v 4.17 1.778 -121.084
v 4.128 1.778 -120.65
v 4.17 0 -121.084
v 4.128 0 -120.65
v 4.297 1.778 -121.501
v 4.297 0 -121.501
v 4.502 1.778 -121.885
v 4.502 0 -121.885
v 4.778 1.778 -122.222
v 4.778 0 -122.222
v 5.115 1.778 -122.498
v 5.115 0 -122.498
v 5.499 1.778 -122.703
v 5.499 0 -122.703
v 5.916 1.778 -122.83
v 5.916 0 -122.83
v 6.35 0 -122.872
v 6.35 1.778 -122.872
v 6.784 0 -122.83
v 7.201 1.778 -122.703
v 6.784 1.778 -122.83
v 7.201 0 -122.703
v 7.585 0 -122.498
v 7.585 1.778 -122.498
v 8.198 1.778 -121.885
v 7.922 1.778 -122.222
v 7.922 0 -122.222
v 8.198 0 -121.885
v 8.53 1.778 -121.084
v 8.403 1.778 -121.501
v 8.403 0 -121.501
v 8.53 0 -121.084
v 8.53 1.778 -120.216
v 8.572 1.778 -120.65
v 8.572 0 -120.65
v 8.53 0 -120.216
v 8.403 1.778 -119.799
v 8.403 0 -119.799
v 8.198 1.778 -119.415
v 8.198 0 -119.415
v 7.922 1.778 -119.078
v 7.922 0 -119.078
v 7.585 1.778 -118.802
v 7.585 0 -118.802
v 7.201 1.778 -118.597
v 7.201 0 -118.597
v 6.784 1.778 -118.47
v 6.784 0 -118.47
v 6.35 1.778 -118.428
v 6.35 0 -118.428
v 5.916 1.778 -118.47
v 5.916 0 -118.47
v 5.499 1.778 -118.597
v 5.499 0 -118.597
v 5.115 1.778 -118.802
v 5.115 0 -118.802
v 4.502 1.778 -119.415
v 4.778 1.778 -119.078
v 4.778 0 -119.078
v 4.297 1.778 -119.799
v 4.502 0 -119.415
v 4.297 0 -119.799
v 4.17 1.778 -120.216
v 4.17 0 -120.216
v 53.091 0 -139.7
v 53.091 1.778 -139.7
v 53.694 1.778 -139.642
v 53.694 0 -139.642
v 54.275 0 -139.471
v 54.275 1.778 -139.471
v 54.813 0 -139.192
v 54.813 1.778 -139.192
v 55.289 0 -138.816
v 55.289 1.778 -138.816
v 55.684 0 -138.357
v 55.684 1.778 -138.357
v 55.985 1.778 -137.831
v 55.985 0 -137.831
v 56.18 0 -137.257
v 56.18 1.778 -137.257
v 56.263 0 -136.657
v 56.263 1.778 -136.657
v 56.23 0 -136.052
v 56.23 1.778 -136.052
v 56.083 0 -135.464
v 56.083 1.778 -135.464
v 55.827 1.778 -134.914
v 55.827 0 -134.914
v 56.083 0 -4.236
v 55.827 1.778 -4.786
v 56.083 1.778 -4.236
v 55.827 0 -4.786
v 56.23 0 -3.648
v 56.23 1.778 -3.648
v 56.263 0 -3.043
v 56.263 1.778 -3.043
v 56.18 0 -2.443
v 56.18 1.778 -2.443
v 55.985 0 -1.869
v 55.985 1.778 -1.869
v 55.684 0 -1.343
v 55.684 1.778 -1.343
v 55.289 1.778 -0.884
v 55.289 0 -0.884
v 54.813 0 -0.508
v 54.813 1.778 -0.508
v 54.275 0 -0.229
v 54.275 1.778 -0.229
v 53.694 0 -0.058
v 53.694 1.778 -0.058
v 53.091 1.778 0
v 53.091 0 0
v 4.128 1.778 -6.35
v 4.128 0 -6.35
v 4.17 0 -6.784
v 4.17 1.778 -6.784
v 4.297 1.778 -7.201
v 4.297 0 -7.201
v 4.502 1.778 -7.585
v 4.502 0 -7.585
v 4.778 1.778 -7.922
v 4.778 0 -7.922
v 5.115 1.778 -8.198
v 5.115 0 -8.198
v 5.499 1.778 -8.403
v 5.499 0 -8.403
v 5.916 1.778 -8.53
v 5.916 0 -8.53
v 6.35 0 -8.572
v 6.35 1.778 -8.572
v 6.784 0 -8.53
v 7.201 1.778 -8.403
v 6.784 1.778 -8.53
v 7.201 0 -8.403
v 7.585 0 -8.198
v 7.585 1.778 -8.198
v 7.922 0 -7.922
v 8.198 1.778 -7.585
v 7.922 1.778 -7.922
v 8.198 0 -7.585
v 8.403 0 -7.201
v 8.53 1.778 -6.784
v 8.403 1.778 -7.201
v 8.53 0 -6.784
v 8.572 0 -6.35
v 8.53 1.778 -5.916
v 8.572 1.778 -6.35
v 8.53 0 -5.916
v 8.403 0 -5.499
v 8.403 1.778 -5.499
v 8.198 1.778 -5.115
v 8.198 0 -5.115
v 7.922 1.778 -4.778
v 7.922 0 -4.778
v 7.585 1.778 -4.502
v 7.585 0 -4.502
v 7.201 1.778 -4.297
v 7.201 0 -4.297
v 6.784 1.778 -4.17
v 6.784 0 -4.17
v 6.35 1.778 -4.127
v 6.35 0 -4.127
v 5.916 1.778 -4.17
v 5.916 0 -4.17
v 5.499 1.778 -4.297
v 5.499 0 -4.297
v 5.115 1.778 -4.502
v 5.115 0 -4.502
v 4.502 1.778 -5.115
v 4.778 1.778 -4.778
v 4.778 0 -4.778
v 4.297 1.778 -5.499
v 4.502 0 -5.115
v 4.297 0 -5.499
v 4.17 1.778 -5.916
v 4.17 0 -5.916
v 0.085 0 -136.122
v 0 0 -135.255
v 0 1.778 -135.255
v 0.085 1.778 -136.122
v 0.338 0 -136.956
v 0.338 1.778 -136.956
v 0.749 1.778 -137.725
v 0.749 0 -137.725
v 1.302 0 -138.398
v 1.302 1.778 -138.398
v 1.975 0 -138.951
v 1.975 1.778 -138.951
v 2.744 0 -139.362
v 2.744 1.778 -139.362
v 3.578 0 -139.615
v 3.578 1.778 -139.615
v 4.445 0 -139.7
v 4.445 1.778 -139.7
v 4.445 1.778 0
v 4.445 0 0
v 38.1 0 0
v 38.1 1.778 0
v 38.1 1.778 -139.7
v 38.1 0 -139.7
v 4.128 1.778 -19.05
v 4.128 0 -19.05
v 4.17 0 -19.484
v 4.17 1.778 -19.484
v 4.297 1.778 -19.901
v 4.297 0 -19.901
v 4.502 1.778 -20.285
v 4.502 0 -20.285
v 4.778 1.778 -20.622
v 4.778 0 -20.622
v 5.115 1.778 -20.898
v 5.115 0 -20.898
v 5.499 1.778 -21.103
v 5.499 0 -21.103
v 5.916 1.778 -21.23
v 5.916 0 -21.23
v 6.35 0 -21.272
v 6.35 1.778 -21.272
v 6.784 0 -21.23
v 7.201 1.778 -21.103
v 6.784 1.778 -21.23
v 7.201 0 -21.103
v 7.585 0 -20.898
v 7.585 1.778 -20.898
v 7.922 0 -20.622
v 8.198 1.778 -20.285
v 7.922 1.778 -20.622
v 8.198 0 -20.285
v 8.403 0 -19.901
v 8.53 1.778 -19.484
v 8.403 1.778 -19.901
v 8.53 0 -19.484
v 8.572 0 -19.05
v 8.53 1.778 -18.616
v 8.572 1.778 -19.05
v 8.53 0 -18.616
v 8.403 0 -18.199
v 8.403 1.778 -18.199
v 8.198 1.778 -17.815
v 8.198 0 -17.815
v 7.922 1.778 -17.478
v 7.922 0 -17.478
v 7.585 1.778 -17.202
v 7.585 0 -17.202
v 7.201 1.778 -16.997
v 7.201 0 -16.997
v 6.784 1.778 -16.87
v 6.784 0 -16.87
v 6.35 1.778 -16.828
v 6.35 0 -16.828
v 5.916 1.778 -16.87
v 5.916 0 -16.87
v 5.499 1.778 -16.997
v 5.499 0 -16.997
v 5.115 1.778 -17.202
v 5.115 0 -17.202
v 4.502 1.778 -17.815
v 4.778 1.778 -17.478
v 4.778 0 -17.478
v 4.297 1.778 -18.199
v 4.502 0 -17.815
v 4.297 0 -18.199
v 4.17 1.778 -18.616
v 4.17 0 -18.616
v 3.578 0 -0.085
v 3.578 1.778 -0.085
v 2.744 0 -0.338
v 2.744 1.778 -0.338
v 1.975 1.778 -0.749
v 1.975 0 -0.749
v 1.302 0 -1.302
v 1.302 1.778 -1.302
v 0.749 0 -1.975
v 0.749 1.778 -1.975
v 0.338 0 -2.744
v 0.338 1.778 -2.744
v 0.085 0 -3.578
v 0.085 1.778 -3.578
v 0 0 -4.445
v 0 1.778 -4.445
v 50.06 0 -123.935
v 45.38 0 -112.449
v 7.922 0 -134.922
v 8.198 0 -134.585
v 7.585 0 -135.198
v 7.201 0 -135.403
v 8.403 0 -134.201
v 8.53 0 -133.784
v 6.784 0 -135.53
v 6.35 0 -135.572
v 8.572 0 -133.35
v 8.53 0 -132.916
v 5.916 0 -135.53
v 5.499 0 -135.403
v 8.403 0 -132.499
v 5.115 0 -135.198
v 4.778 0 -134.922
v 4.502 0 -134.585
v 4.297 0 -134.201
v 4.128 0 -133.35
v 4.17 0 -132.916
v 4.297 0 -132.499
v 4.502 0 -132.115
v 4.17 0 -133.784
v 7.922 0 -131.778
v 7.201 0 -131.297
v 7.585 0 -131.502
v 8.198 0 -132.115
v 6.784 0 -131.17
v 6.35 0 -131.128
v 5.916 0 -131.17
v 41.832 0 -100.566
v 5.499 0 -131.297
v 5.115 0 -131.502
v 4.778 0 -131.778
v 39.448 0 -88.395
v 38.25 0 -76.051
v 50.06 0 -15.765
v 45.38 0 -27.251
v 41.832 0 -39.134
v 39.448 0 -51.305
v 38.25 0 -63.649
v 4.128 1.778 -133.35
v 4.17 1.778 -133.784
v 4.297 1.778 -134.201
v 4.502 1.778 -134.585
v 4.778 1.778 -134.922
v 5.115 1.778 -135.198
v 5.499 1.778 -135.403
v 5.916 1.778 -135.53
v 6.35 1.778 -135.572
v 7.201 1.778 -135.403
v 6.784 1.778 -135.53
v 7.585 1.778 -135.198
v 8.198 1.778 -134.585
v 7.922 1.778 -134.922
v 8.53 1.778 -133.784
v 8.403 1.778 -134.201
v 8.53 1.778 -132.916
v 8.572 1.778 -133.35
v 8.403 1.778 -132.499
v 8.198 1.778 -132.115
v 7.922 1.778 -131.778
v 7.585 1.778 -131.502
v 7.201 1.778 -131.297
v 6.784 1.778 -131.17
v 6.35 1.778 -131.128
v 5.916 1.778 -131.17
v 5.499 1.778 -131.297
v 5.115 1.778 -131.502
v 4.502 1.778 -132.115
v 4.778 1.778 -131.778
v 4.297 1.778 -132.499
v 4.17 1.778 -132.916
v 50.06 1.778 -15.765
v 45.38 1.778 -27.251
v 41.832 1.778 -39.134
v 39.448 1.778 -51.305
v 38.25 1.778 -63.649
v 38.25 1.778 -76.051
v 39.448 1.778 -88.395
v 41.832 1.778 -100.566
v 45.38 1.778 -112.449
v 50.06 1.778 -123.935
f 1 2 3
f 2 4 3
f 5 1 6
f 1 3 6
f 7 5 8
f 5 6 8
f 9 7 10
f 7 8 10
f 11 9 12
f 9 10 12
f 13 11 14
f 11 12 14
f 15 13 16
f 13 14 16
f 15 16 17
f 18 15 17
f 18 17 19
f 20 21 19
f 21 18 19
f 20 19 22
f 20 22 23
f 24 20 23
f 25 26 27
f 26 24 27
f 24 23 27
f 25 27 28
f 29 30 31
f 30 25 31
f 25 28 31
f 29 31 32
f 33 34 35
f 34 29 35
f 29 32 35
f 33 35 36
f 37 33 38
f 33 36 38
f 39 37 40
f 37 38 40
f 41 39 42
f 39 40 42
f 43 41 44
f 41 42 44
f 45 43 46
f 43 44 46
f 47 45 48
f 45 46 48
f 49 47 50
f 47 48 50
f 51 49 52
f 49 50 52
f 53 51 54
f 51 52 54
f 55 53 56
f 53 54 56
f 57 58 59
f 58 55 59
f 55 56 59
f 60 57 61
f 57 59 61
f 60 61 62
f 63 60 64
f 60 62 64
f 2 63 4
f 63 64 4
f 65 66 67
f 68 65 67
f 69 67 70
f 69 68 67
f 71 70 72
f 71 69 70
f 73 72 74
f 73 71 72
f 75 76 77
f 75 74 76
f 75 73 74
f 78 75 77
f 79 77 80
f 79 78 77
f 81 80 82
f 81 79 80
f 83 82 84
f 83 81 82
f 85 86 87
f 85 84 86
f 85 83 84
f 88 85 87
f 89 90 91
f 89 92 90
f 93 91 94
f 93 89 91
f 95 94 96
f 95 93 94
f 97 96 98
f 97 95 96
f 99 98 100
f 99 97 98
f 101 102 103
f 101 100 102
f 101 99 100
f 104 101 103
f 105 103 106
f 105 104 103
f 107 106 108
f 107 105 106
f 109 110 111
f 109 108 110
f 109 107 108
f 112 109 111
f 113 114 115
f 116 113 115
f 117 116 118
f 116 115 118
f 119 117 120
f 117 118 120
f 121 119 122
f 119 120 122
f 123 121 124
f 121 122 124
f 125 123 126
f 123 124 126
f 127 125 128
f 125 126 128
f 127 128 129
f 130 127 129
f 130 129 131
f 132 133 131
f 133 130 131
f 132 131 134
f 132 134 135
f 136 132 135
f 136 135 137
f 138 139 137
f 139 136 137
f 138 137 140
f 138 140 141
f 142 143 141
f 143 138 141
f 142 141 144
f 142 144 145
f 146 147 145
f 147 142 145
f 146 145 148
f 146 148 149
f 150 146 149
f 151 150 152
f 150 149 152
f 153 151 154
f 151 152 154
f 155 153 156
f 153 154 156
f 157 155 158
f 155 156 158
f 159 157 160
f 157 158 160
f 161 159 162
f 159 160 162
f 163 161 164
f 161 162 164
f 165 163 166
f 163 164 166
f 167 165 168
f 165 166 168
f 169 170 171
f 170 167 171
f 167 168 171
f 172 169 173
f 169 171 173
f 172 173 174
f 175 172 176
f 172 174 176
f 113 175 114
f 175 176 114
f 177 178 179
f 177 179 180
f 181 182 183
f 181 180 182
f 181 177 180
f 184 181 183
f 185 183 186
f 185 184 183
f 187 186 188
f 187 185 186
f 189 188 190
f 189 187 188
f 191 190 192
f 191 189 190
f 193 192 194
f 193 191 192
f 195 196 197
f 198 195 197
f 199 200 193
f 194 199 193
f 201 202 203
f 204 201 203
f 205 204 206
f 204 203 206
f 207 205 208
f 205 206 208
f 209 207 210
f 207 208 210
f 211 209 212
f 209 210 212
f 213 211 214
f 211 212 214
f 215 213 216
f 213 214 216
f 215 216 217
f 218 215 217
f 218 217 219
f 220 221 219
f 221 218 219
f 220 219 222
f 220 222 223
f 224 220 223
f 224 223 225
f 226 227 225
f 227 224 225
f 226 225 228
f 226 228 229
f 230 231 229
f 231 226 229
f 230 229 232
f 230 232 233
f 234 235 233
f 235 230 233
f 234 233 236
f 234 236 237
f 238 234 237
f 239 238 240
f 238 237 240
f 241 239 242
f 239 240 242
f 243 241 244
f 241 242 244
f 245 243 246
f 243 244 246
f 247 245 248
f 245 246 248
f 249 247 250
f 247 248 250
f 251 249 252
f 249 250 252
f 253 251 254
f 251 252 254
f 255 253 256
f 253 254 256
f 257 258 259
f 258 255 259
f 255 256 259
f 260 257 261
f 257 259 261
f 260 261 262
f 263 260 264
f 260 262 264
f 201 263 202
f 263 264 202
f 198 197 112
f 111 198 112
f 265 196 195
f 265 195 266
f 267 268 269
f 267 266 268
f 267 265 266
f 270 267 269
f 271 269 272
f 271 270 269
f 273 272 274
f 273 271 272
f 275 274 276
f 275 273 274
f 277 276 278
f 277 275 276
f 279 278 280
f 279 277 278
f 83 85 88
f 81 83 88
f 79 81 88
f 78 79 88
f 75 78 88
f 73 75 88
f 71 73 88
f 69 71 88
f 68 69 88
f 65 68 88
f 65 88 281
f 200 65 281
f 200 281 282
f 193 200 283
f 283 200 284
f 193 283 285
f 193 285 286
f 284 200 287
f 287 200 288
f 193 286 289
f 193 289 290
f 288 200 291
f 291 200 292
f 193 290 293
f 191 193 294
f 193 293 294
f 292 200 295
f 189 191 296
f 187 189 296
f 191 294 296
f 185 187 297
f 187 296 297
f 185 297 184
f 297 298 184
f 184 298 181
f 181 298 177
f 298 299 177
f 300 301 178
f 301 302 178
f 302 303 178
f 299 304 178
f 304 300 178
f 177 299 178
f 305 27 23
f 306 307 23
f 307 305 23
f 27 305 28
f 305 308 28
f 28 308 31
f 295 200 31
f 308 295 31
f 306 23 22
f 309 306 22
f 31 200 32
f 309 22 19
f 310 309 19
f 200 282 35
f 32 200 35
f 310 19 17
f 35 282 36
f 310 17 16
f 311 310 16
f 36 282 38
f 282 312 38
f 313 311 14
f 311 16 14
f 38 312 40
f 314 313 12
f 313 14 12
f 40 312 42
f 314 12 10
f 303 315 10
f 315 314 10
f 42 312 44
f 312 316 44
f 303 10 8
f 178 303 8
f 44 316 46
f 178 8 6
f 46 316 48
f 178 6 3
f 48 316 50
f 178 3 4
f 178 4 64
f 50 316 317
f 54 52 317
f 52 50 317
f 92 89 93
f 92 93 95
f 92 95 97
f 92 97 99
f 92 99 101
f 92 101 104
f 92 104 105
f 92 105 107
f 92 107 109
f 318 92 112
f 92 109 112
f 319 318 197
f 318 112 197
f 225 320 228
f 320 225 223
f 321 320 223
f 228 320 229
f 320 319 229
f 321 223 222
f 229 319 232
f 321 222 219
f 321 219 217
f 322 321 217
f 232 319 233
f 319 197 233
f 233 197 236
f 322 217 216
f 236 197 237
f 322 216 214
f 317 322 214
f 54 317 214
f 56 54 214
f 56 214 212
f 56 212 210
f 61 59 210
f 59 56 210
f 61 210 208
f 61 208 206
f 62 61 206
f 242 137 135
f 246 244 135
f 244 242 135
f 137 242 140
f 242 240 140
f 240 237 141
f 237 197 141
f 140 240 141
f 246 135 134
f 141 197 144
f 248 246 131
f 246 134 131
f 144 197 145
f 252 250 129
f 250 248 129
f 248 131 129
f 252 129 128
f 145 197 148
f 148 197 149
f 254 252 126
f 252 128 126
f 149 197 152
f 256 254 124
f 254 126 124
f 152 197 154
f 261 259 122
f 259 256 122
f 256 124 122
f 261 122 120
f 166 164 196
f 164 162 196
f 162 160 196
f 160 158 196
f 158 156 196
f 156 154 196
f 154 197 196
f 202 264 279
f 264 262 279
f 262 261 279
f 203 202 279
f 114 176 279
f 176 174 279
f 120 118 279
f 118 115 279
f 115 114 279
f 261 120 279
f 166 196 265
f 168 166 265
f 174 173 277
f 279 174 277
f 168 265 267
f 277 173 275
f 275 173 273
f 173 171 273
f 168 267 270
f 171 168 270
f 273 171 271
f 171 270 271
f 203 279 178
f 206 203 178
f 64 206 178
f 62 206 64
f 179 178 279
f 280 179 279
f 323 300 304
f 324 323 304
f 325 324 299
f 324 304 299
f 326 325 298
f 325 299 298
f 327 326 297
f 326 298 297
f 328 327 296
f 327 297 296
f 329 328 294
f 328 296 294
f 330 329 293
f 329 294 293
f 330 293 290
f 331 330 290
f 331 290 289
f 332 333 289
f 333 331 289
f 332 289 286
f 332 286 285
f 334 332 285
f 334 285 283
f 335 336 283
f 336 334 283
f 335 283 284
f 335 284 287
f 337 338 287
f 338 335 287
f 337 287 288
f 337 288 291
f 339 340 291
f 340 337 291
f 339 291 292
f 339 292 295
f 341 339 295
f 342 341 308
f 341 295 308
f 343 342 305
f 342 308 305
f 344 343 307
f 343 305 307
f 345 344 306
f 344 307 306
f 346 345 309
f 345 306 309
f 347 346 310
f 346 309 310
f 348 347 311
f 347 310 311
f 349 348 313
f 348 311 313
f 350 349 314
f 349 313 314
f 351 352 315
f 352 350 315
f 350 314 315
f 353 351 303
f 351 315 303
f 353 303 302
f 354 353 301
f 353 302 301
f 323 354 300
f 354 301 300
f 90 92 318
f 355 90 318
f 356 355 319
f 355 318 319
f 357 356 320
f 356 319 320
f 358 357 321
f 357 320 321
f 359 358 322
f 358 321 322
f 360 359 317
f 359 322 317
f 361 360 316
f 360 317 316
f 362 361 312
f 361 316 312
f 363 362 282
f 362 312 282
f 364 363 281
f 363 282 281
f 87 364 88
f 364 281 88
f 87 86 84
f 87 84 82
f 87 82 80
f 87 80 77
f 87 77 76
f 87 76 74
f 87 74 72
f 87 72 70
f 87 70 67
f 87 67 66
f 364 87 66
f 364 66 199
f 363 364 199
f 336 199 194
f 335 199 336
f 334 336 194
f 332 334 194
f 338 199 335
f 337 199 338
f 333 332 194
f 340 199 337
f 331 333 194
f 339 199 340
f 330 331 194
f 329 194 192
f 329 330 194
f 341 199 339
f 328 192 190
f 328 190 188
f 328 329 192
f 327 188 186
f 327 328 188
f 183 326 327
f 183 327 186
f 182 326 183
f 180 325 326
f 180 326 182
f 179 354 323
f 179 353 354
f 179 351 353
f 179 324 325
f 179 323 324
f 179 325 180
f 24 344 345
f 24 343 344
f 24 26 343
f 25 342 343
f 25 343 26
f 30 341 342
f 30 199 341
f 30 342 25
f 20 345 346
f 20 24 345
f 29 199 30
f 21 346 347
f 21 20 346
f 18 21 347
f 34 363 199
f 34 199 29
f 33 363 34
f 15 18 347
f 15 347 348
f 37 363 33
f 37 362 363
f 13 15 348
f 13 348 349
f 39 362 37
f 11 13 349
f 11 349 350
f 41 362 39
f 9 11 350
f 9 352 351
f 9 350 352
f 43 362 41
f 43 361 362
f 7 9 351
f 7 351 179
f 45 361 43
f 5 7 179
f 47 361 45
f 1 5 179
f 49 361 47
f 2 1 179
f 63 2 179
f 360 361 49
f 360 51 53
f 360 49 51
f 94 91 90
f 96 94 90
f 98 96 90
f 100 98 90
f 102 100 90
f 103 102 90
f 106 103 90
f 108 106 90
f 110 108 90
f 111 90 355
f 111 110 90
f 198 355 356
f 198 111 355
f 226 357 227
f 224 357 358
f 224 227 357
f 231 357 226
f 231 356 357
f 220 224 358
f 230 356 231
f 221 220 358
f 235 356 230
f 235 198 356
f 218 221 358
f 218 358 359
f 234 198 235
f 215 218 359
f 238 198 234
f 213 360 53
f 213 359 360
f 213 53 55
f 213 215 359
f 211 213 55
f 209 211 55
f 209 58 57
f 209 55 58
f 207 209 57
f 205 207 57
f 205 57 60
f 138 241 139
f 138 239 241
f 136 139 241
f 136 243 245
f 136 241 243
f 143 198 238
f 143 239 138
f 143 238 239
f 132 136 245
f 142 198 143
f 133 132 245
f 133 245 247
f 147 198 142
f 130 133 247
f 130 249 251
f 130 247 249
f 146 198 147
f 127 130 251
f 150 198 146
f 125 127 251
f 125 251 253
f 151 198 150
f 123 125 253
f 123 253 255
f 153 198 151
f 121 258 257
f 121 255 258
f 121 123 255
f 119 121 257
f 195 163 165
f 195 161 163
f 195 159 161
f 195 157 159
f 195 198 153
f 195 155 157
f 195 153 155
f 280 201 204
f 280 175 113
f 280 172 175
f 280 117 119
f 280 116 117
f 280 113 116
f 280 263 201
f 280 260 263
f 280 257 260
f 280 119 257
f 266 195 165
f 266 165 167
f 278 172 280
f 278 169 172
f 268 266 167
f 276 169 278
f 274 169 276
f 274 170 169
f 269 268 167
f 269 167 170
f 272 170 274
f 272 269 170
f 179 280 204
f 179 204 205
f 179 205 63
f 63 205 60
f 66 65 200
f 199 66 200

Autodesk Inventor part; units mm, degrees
ref_plane "YZ Plane" through (0, 0, 0) normal (1, 0, 0) x (0, 1, 0)
ref_plane "XZ Plane" through (0, 0, 0) normal (0, 1, 0) x (-1, 0, 0)
ref_plane "XY Plane" through (0, 0, 0) normal (0, 0, 1) x (1, 0, 0)
sketch "Sketch1" plane through (0, 0, 0) normal (0, 1, 0) x (-1, 0, 0)
  line L0 (-4.445, 0) -> (-38.1, 0)
  line L1 (-38.1, -139.7) -> (-4.445, -139.7)
  line L2 (0, -135.255) -> (0, -4.445)
  arc A0 (-55.8268, -134.9145) -> (-55.8268, -4.7855) centre (-166.37, -69.85) ccw
  line L3 (-38.1, 0) -> (-53.0906, 0)
  line L4 (-53.0906, -139.7) -> (-38.1, -139.7)
  arc A1 (-4.445, -139.7) -> (0, -135.255) centre (-4.445, -135.255) ccw
  arc A2 (0, -4.445) -> (-4.445, 0) centre (-4.445, -4.445) ccw
  arc A3 (-53.0906, 0) -> (-55.8268, -4.7855) centre (-53.0906, -3.175) ccw
  arc A4 (-55.8268, -134.9145) -> (-53.0906, -139.7) centre (-53.0906, -136.525) ccw
  circle A5 centre (-6.35, -6.35) radius 2.2225
  circle A6 centre (-6.35, -19.05) radius 2.2225
  circle A7 centre (-6.35, -133.35) radius 2.2225
  circle A8 centre (-6.35, -120.65) radius 2.2225
  point P0 (0, 0)
  point P1 (0, -139.7)
  point P2 (-58.7867, -139.7)
  point P3 (-58.7867, 0)
  dimension "d0" = 38.1
  dimension "d4" = 4.445
  dimension "d5" = 4.445
  dimension "d6" = 3.175
  dimension "d7" = 4.445
  dimension "d8" = 4.445
  dimension "d9" = 4.445
  dimension "d10" = 4.445
extrude "Extrusion1" add sketch "Sketch1" along normal blind 1.778
properties part number "claw_aligner_piece"
